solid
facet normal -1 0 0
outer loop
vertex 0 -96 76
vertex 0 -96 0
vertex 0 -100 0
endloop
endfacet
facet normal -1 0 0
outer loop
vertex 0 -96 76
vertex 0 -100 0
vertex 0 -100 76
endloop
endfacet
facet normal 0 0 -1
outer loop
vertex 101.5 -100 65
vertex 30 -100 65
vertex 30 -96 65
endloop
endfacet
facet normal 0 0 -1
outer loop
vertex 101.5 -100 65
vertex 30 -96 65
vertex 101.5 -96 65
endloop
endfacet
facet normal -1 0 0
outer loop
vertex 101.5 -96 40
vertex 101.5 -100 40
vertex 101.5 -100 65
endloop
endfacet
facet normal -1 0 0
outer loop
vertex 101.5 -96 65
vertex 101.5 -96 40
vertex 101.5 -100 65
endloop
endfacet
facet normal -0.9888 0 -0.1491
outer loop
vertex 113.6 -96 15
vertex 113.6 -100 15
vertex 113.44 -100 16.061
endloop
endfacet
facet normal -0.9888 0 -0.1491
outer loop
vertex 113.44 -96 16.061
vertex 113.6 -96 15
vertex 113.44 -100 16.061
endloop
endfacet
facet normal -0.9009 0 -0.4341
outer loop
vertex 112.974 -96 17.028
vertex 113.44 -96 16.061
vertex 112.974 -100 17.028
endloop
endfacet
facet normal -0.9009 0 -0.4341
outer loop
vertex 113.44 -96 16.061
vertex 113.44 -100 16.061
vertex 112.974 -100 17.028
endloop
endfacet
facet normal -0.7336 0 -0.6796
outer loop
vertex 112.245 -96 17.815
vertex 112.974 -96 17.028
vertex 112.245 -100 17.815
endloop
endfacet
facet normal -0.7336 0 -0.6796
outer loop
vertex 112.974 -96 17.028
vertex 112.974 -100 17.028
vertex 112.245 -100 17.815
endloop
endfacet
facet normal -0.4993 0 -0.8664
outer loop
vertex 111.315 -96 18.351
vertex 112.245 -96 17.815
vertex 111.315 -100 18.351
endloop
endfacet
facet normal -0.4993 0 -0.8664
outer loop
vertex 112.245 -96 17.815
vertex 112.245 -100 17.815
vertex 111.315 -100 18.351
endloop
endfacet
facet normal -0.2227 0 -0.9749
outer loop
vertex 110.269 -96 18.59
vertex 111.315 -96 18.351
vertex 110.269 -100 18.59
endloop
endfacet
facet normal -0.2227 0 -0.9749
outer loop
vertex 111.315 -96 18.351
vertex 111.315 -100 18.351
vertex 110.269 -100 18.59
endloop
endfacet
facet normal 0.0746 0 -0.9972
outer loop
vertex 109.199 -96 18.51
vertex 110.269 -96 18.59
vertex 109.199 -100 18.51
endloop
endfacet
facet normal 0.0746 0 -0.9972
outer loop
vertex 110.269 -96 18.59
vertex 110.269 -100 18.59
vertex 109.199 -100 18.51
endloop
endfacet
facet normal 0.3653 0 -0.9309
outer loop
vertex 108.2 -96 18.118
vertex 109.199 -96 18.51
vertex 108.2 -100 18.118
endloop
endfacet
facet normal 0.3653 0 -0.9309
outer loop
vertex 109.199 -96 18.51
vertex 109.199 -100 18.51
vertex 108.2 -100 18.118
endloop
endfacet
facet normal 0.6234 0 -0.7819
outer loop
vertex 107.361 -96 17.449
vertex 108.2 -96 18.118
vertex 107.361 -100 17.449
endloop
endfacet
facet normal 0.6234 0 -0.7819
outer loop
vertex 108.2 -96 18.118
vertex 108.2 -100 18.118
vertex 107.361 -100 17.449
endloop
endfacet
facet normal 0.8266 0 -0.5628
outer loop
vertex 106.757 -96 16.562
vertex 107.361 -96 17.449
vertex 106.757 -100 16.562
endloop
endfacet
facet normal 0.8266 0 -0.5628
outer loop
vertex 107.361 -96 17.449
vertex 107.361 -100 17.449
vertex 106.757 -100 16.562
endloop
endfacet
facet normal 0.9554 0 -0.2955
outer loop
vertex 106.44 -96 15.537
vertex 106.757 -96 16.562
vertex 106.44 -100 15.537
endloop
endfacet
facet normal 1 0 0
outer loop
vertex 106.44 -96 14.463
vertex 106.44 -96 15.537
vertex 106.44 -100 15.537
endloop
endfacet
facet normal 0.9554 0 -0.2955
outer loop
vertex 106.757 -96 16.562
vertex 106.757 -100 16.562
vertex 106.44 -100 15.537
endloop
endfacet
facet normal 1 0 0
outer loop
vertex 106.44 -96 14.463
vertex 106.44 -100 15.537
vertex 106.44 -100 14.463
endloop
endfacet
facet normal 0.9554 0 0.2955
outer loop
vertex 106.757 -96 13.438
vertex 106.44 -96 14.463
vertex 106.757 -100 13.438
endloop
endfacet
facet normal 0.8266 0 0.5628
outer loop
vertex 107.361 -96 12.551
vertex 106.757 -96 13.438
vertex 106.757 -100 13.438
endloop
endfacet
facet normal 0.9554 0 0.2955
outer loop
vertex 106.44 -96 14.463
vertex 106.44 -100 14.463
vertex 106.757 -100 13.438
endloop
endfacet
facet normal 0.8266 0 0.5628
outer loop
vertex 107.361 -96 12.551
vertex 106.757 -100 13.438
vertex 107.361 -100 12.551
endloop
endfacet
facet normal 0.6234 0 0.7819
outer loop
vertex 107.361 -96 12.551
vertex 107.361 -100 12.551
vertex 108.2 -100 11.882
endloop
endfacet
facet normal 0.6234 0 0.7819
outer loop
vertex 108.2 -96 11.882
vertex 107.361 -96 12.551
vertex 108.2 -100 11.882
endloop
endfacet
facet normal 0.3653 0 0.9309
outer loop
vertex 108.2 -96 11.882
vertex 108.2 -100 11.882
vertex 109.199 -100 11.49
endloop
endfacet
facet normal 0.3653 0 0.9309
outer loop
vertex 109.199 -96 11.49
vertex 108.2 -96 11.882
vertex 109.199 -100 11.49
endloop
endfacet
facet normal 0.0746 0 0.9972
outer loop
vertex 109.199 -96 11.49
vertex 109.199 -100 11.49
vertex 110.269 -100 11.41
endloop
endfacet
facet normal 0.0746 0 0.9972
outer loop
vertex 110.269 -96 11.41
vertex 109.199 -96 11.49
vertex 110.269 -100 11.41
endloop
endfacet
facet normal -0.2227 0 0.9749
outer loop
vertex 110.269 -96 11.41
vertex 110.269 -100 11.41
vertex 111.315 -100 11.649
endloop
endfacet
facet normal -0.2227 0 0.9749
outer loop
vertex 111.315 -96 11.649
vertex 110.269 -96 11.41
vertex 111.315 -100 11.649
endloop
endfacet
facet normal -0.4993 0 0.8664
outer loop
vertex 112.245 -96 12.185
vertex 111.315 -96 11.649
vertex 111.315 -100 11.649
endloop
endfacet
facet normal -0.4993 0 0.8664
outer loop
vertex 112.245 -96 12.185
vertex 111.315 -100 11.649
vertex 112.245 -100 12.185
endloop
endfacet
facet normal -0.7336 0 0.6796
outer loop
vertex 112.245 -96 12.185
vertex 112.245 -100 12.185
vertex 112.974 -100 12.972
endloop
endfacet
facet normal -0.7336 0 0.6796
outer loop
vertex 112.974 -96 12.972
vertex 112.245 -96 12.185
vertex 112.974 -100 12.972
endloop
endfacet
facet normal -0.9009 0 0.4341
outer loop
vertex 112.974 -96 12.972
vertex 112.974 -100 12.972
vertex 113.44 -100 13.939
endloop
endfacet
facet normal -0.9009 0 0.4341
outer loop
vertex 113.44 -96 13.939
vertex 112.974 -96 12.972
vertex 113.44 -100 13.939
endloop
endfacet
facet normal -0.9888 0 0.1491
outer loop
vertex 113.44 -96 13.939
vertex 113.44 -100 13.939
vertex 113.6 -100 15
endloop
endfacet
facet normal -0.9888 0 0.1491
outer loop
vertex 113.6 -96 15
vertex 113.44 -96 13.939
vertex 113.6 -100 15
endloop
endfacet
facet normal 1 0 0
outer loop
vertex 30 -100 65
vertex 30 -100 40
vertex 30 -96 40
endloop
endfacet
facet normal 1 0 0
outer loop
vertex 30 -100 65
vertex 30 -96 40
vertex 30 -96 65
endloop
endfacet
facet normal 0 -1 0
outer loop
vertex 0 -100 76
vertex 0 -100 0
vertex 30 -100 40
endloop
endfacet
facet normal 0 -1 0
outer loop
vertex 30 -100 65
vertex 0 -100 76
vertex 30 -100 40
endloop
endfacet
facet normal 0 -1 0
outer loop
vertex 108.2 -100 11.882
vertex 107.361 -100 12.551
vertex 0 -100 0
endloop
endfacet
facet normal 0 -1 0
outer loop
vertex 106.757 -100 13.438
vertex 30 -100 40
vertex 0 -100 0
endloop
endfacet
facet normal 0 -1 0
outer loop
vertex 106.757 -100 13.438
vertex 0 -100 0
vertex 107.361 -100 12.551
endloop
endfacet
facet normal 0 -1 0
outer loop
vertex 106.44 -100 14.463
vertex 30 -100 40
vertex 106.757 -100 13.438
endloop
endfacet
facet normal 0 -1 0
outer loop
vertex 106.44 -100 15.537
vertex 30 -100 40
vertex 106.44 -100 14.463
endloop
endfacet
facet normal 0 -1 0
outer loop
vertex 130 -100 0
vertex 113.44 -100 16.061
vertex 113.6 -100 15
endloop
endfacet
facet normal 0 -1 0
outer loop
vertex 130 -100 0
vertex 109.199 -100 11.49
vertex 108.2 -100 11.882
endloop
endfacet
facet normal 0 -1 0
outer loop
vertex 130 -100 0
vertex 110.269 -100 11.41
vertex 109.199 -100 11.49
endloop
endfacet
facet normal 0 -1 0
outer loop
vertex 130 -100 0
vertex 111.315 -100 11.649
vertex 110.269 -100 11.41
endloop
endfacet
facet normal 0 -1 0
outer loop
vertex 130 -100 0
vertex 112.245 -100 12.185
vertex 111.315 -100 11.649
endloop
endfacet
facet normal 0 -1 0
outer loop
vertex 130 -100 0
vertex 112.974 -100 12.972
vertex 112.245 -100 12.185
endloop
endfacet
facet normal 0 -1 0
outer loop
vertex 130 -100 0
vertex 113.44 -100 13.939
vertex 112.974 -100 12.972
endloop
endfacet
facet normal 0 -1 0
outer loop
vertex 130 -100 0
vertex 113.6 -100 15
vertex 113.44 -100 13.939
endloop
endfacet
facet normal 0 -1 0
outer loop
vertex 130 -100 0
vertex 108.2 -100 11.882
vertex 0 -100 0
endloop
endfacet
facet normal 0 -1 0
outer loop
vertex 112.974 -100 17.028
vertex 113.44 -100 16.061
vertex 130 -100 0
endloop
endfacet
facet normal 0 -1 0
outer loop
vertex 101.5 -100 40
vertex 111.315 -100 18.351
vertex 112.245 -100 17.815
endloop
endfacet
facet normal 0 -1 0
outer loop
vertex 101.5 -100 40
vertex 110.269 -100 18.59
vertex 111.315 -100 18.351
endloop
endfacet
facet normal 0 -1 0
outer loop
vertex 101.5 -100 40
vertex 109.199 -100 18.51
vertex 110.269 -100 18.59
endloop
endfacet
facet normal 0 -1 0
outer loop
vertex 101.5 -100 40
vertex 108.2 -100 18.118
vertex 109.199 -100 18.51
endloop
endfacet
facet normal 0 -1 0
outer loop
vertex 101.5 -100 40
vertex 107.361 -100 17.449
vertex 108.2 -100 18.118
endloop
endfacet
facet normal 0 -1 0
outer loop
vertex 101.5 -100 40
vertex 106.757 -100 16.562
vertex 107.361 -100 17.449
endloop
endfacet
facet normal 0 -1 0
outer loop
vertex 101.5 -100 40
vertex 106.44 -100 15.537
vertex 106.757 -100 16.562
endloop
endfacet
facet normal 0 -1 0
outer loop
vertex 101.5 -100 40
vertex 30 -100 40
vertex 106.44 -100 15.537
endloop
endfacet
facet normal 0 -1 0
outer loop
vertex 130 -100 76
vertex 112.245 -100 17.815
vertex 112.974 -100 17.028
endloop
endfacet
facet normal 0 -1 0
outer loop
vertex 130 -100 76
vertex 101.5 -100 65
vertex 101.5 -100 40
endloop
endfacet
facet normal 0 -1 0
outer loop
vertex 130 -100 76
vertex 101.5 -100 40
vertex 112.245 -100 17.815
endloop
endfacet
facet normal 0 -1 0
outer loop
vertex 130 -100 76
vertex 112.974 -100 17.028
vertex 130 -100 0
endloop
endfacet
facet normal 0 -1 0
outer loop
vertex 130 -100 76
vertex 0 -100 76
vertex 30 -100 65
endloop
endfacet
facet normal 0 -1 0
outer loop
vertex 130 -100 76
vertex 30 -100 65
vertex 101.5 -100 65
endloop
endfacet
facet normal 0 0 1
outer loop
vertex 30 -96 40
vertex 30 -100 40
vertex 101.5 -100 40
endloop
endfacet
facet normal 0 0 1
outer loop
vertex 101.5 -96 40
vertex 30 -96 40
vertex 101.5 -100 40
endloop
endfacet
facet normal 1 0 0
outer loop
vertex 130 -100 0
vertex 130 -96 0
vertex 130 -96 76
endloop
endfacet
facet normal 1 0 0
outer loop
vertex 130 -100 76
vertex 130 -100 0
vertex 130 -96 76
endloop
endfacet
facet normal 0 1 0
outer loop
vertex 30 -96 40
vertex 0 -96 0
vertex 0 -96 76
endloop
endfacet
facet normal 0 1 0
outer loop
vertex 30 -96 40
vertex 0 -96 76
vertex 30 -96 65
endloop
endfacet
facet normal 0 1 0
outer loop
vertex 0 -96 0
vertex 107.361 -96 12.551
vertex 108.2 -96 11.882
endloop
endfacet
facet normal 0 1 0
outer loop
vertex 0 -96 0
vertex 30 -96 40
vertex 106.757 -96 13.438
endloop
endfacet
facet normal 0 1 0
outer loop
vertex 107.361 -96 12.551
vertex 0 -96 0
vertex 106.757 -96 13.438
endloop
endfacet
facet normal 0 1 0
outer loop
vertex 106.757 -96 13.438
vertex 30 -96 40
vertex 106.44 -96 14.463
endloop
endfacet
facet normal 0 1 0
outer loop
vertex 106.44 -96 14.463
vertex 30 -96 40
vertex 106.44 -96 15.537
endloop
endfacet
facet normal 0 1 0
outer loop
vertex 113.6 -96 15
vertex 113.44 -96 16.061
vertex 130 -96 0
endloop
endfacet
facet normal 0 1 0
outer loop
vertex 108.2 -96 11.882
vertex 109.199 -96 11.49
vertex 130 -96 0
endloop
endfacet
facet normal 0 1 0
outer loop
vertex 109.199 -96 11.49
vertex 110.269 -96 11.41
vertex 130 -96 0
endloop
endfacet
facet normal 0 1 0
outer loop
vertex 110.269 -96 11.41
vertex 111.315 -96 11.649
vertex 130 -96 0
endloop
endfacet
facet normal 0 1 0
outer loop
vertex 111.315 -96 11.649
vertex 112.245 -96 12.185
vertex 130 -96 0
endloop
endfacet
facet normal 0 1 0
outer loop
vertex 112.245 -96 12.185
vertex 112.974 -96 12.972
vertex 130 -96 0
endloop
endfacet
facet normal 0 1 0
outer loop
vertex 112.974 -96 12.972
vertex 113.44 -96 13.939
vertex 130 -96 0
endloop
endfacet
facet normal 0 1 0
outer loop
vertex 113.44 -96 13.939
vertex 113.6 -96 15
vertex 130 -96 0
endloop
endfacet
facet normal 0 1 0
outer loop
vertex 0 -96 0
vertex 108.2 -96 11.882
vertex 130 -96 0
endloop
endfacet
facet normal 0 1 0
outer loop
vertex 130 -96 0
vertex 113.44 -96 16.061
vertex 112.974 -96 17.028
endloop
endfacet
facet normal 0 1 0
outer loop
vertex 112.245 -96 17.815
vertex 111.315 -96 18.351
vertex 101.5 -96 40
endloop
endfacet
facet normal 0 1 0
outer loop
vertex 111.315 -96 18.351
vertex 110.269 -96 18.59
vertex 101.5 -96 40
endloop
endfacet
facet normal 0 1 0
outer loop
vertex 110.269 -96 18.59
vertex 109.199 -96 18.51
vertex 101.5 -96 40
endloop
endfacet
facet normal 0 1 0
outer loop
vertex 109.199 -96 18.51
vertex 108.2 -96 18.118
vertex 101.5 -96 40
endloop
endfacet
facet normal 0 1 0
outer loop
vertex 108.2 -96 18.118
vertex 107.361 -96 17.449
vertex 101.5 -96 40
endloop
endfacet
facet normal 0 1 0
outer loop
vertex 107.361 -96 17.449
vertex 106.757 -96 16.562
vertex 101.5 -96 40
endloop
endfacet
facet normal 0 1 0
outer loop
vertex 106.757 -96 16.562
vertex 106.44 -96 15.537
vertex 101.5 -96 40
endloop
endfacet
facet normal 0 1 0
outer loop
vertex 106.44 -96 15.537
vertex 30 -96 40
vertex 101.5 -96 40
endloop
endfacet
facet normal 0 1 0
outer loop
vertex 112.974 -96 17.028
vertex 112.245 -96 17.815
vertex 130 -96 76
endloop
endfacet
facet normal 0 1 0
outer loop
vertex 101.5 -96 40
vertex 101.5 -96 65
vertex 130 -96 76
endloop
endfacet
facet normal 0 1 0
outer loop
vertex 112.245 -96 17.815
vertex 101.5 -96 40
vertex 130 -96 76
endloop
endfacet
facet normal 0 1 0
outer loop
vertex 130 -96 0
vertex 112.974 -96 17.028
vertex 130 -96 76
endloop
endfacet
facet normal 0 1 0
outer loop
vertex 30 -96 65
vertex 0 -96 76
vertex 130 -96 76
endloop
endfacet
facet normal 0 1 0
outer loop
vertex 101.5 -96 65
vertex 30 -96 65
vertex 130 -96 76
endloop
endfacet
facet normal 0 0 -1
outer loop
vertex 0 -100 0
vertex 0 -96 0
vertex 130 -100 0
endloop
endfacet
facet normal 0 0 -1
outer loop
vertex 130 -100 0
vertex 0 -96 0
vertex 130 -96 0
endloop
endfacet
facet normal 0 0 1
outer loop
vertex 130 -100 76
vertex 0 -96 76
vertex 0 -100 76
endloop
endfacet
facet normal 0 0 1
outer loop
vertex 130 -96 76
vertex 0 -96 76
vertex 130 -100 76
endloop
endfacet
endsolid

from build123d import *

# Parameters (mm, degrees)
SKETCH005_W     = 130
SKETCH005_H     = 76
PAD003_DEPTH    = 4
SKETCH006_W     = 71.5
SKETCH006_H     = 25
POCKET001_DEPTH = 4.001
SKETCH007_R     = 3.6
HOLE001_DEPTH   = 4.001


with BuildPart() as part:
    # Sketch005 → Pad003 (new body)
    with BuildSketch(Plane.XZ.offset(96)):
        with Locations((65, 38)):
            Rectangle(SKETCH005_W, SKETCH005_H)
    extrude(amount=PAD003_DEPTH)

    # Sketch006 (on Face6 of Pad003) → Pocket001 (cut, through all)
    with BuildSketch(Plane.XZ.offset(100)):
        with Locations((65.75, 52.5)):
            Rectangle(SKETCH006_W, SKETCH006_H)
    extrude(amount=-POCKET001_DEPTH, mode=Mode.SUBTRACT)

    # Sketch007 (on Face5 of Pocket001) → Hole001 (cut, through all)
    with BuildSketch(Plane.XZ.offset(100)):
        with Locations((110, 15)):
            Circle(SKETCH007_R)
    extrude(amount=-HOLE001_DEPTH, mode=Mode.SUBTRACT)


solid = part.part
